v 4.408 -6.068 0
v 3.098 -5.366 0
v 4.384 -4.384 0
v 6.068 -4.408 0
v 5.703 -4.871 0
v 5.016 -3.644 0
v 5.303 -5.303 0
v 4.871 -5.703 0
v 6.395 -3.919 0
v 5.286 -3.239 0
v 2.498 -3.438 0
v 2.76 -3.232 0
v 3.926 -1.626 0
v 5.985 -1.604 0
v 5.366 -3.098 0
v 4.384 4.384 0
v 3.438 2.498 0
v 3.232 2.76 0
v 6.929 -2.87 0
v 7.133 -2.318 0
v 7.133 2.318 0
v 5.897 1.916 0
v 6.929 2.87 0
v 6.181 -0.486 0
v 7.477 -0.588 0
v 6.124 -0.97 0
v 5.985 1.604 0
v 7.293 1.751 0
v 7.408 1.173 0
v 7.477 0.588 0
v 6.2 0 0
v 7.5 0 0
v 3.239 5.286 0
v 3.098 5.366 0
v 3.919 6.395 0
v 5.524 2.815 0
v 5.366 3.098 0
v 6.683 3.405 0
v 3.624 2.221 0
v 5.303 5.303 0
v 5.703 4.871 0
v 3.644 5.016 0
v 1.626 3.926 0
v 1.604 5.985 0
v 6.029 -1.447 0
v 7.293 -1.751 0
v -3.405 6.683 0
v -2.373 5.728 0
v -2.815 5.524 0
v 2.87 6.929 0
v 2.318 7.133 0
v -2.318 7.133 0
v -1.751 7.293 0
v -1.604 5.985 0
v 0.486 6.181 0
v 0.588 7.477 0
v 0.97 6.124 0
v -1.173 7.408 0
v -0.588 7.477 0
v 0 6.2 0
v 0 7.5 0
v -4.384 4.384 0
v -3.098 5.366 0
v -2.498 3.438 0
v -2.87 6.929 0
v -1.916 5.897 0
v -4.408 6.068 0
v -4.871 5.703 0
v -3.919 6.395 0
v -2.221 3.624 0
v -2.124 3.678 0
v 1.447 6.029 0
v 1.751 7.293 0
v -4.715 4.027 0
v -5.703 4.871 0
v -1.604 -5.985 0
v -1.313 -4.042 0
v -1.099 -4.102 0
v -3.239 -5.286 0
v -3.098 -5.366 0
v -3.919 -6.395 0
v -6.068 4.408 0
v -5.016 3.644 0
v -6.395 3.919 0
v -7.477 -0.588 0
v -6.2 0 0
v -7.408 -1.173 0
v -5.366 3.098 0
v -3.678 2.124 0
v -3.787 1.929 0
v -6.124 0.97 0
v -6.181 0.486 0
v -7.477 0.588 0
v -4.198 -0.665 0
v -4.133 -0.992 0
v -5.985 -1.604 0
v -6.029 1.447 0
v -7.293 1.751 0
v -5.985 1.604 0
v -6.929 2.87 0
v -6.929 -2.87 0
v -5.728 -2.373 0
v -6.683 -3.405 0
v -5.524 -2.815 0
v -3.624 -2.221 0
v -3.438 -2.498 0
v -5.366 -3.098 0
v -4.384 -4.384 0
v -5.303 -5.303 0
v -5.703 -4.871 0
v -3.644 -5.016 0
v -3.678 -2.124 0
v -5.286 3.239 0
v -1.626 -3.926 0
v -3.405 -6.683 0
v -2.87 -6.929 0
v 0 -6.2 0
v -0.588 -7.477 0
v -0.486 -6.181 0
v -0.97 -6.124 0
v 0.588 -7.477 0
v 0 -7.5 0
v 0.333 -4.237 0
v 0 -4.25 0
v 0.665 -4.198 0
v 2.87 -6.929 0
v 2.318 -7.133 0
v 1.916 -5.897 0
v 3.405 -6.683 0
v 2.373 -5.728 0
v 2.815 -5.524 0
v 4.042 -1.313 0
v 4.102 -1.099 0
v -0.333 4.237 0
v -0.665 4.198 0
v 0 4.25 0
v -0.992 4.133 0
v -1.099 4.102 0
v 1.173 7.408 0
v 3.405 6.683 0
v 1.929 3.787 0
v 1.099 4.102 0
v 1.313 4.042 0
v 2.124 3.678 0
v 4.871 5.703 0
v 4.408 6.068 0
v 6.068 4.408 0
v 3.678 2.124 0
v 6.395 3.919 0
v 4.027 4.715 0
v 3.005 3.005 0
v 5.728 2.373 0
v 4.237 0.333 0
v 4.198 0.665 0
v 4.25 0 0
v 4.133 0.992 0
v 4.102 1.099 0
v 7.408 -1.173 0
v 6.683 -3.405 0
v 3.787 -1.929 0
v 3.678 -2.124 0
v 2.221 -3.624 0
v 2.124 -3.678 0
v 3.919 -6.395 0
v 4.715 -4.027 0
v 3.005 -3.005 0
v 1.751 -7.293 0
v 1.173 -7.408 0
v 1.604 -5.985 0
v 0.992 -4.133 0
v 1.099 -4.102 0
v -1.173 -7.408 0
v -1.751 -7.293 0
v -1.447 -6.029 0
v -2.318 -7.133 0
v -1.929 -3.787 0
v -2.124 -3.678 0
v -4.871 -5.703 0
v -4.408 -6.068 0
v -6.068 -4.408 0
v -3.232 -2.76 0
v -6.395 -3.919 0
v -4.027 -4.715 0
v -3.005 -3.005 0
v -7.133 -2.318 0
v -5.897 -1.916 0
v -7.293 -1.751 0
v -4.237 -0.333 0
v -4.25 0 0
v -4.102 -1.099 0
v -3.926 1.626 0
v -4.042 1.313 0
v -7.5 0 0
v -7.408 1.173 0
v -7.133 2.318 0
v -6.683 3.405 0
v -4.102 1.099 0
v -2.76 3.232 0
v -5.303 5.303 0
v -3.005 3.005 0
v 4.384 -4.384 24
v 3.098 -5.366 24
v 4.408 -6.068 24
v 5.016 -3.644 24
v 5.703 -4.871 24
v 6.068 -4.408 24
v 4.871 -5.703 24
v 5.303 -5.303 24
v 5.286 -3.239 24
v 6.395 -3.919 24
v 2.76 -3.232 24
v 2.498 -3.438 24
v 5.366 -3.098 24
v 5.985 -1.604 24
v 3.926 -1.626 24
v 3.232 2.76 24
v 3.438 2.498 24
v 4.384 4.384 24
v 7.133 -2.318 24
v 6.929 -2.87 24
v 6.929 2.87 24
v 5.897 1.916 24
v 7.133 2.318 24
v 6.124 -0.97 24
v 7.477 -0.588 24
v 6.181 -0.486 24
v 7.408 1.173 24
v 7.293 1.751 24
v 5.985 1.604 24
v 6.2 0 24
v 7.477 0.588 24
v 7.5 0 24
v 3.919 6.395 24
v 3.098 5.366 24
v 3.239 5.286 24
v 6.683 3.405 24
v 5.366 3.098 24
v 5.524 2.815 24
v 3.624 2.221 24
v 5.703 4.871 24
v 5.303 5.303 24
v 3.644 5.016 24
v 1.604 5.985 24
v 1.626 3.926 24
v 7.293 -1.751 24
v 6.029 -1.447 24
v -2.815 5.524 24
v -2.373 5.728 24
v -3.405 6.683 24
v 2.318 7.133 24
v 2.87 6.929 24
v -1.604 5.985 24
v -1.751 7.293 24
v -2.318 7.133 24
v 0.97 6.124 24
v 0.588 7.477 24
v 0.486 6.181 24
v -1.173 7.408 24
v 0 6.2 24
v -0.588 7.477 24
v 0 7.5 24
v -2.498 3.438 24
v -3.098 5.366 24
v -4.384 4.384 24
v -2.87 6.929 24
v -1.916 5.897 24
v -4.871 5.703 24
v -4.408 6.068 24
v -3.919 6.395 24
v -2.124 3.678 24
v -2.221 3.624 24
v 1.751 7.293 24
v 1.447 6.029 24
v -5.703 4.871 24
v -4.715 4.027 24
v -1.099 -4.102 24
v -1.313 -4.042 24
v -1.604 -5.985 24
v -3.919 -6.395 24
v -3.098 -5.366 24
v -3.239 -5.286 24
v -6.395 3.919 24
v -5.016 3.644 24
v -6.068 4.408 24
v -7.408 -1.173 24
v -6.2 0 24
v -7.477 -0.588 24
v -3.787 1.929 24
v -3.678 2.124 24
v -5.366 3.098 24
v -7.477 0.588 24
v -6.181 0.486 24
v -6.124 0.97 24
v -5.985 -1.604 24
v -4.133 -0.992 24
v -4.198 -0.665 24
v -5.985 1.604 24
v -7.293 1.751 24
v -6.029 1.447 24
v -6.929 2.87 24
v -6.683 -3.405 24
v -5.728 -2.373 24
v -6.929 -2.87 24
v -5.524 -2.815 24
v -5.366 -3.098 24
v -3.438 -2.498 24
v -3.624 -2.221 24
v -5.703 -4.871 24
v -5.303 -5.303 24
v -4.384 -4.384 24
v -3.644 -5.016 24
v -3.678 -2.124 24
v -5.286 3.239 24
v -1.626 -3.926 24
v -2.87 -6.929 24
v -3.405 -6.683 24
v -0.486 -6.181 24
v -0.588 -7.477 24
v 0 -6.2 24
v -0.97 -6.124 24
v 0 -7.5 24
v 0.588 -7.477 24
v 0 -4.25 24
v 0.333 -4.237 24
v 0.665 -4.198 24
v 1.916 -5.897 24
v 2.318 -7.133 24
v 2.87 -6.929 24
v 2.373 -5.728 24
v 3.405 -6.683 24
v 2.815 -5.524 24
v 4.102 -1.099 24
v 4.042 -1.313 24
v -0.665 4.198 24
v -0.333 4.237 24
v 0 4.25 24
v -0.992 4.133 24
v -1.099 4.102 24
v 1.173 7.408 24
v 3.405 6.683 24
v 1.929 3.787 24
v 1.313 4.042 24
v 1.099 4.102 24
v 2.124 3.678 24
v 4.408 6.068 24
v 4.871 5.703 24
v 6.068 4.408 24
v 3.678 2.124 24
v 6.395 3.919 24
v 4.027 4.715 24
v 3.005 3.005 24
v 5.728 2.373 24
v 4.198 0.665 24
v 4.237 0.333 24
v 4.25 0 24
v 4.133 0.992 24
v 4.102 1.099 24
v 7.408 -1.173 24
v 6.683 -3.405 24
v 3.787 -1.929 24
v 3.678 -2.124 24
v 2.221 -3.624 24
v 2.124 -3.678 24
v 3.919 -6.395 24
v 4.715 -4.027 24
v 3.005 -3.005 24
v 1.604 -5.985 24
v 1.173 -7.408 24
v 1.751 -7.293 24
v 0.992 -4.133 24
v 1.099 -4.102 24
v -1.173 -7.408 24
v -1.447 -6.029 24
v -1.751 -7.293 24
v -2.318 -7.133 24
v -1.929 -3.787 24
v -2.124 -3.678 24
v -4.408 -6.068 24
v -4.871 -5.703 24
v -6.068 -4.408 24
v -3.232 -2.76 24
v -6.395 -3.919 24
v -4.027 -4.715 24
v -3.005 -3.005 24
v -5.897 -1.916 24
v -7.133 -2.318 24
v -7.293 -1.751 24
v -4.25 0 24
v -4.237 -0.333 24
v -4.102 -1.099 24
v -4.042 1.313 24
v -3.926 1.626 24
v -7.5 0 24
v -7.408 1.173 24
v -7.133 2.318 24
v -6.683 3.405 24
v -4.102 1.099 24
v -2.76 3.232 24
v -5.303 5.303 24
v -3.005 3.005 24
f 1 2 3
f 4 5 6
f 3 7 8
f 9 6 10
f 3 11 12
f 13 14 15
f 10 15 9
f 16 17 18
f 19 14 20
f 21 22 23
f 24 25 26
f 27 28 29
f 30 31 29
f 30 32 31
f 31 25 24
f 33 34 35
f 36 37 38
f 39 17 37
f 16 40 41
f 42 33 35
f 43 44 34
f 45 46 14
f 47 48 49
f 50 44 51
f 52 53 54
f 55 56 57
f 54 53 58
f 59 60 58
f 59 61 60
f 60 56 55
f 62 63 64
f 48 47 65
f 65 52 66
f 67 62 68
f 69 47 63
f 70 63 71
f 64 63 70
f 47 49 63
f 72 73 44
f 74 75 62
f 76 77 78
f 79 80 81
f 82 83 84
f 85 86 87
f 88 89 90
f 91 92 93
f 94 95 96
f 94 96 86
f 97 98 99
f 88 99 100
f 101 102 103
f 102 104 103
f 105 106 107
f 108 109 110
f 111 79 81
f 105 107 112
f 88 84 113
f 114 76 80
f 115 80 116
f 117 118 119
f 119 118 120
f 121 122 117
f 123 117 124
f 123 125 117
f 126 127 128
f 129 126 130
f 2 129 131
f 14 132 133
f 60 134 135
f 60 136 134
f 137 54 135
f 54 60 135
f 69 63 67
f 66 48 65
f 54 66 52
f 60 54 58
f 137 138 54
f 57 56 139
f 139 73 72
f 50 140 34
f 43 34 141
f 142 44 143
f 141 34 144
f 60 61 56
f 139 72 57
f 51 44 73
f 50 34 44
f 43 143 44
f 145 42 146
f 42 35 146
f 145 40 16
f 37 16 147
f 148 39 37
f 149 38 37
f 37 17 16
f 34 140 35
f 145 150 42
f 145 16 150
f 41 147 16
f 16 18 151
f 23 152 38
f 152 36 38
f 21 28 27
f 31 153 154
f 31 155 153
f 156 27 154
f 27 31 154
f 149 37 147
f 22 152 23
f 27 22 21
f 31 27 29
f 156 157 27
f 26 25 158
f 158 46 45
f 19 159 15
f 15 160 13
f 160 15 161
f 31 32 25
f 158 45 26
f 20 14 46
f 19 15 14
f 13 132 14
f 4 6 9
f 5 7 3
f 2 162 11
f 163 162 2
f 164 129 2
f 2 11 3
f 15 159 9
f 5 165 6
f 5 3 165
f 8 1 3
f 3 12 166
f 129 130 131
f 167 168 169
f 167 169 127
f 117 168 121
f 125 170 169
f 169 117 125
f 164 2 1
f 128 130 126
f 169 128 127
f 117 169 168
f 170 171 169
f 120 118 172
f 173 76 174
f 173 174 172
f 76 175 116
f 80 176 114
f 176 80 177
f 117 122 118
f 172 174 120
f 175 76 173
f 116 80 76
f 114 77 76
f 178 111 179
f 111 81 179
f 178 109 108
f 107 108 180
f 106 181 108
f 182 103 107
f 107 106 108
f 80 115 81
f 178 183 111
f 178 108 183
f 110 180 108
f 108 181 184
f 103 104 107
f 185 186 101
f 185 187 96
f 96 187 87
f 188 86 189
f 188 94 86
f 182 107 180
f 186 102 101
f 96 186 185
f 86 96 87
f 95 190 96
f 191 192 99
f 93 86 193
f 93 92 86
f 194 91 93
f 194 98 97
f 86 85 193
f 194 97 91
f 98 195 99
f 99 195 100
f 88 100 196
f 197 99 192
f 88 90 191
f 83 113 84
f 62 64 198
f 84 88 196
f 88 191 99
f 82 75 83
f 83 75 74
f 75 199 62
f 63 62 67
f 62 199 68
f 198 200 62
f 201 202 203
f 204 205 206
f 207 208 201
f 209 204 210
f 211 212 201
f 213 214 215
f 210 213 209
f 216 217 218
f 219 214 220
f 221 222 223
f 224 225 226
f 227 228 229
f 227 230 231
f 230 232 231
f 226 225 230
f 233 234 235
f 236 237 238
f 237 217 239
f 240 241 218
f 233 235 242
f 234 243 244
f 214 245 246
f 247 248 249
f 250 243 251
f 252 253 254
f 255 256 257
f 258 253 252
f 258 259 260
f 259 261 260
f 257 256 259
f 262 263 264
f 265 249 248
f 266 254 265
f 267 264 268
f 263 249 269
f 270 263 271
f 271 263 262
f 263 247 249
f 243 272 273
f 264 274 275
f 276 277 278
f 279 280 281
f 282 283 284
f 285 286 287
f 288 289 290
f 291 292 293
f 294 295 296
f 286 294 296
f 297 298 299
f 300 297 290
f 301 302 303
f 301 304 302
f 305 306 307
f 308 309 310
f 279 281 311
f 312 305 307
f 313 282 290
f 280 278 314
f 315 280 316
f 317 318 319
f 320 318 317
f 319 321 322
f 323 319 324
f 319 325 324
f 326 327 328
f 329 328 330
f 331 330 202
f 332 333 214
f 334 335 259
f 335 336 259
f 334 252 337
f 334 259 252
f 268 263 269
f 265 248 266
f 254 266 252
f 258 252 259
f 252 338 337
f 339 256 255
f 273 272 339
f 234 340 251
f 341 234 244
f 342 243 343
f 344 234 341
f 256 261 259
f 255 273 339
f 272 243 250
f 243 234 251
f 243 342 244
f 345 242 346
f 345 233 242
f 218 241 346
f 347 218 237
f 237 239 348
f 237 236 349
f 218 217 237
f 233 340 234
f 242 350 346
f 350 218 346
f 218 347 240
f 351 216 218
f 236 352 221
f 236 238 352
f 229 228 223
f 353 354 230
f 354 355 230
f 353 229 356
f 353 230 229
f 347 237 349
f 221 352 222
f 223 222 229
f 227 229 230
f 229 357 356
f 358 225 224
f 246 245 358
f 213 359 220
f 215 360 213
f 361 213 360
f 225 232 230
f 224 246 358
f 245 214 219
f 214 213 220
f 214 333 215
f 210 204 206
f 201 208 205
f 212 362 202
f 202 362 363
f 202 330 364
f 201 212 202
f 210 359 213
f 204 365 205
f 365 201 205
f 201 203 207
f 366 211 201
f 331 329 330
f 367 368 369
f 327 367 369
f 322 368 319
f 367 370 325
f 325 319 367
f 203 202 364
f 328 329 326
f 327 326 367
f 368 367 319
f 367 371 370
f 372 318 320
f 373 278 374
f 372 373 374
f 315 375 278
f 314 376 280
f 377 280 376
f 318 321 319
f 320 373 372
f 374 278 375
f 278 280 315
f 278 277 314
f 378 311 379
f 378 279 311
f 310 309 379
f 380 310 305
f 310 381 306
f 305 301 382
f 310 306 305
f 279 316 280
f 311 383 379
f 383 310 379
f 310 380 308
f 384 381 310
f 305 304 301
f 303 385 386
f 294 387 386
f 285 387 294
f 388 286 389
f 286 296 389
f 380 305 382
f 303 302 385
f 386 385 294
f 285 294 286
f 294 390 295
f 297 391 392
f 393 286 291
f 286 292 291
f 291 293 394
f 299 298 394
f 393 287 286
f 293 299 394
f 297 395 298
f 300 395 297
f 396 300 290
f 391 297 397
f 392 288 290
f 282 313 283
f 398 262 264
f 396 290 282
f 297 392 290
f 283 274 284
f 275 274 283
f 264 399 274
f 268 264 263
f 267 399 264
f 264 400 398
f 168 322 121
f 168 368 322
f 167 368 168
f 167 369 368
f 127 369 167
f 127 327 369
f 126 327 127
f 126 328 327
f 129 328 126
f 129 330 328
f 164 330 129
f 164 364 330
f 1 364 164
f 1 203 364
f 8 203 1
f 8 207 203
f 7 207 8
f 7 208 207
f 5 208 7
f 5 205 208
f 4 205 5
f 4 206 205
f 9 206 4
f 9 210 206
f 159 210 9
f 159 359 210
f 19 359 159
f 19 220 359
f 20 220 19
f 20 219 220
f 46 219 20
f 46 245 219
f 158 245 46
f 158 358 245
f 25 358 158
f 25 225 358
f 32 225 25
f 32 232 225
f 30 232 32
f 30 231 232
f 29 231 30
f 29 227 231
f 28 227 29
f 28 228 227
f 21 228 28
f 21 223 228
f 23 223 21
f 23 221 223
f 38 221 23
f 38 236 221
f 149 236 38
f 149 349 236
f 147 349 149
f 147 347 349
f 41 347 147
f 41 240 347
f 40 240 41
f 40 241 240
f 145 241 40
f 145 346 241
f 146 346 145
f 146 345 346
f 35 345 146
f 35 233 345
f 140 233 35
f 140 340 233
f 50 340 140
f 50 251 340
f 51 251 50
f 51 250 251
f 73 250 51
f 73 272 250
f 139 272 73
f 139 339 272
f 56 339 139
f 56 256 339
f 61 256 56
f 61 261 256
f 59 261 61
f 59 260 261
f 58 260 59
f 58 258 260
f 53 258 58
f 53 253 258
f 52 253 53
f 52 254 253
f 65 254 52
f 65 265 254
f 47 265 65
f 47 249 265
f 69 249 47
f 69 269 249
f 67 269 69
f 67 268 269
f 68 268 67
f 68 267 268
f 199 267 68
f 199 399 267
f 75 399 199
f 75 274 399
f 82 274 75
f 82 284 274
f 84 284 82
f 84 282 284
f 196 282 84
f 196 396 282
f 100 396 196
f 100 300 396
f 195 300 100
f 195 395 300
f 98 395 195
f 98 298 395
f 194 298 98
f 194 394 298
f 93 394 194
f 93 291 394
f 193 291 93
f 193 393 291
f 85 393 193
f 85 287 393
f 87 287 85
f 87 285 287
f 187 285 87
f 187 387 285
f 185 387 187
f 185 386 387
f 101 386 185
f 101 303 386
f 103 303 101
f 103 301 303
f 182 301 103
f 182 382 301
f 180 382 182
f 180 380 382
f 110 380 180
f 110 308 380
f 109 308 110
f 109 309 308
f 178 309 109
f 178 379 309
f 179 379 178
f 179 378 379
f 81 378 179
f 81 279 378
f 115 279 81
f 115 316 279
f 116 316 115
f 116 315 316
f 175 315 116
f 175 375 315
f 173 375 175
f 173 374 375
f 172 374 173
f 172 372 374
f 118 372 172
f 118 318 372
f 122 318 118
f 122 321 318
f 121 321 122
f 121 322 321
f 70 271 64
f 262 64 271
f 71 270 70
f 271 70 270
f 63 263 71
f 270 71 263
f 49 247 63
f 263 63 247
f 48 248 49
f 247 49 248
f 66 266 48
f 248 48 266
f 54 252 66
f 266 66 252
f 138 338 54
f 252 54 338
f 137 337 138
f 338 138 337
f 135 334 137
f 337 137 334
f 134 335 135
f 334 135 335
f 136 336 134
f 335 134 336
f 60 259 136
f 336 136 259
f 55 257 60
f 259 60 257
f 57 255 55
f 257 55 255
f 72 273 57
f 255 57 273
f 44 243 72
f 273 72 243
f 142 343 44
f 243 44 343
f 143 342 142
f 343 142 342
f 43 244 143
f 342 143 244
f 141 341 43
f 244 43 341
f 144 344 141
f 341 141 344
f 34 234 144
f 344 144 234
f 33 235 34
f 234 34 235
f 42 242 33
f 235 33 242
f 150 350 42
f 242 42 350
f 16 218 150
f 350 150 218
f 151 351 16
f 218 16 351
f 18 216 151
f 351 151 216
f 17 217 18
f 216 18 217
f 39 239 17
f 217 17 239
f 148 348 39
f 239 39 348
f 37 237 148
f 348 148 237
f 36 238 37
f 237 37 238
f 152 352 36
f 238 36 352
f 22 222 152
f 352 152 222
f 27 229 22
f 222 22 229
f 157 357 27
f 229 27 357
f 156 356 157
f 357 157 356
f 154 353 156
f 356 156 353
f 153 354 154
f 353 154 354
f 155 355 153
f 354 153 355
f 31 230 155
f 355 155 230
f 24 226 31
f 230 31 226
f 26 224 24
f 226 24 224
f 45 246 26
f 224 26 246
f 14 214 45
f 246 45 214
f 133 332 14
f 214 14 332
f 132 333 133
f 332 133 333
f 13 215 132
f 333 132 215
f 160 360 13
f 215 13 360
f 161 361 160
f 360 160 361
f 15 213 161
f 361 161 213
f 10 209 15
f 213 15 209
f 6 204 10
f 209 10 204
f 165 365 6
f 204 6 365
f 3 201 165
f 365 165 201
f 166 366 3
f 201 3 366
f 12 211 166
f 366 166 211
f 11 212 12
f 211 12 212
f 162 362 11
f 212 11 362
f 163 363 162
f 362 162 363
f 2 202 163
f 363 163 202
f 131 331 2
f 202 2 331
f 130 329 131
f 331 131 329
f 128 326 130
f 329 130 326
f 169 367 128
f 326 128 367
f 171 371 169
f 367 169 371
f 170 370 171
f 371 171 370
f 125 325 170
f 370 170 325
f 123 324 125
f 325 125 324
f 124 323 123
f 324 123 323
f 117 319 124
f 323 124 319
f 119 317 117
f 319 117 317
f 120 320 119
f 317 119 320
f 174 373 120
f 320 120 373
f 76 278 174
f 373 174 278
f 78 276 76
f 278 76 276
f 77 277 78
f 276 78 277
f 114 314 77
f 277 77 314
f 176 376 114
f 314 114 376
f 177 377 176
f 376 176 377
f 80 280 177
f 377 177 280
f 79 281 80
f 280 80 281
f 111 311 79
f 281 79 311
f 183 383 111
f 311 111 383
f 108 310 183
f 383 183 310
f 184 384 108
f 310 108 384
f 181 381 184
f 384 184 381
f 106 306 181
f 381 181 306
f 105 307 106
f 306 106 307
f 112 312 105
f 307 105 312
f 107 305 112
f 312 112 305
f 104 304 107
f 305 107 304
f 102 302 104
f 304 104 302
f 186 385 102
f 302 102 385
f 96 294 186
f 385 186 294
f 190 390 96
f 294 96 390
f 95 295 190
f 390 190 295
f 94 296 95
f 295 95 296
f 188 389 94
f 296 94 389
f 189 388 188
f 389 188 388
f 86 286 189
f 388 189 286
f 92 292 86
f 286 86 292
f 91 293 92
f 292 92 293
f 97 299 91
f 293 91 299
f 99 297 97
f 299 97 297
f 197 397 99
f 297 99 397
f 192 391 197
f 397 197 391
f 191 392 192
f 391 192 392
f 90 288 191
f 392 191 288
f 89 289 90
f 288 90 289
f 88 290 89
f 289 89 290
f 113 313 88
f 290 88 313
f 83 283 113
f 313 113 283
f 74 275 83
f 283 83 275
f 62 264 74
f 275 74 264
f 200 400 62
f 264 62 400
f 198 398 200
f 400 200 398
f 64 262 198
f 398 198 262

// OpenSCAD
// outer diameter in mm
outerD=15;

// inner diameter in mm
innerD=8.5;

// height in mm
height=24;

// amount of spikes
N = 12;

// width of shield in mm
shield = 1.3;

//resolution
res = 80;

/*[hidden]*/
d=outerD;
t=shield;
n=N;
id=innerD;
h=height;


$fn=res;

linear_extrude(height=h) 
difference() {
union() {
difference() {
circle(d=d);
circle(d=d-t*2);
}

a=360/n/2;

for (i=[1:1:n]) {


r=d/2-t/2;
rotate(a*2*(i-1))
polygon([[r,0],[0,0],[cos(a)*r,sin(a)*r]]);
}
}

circle(d=id);
}
